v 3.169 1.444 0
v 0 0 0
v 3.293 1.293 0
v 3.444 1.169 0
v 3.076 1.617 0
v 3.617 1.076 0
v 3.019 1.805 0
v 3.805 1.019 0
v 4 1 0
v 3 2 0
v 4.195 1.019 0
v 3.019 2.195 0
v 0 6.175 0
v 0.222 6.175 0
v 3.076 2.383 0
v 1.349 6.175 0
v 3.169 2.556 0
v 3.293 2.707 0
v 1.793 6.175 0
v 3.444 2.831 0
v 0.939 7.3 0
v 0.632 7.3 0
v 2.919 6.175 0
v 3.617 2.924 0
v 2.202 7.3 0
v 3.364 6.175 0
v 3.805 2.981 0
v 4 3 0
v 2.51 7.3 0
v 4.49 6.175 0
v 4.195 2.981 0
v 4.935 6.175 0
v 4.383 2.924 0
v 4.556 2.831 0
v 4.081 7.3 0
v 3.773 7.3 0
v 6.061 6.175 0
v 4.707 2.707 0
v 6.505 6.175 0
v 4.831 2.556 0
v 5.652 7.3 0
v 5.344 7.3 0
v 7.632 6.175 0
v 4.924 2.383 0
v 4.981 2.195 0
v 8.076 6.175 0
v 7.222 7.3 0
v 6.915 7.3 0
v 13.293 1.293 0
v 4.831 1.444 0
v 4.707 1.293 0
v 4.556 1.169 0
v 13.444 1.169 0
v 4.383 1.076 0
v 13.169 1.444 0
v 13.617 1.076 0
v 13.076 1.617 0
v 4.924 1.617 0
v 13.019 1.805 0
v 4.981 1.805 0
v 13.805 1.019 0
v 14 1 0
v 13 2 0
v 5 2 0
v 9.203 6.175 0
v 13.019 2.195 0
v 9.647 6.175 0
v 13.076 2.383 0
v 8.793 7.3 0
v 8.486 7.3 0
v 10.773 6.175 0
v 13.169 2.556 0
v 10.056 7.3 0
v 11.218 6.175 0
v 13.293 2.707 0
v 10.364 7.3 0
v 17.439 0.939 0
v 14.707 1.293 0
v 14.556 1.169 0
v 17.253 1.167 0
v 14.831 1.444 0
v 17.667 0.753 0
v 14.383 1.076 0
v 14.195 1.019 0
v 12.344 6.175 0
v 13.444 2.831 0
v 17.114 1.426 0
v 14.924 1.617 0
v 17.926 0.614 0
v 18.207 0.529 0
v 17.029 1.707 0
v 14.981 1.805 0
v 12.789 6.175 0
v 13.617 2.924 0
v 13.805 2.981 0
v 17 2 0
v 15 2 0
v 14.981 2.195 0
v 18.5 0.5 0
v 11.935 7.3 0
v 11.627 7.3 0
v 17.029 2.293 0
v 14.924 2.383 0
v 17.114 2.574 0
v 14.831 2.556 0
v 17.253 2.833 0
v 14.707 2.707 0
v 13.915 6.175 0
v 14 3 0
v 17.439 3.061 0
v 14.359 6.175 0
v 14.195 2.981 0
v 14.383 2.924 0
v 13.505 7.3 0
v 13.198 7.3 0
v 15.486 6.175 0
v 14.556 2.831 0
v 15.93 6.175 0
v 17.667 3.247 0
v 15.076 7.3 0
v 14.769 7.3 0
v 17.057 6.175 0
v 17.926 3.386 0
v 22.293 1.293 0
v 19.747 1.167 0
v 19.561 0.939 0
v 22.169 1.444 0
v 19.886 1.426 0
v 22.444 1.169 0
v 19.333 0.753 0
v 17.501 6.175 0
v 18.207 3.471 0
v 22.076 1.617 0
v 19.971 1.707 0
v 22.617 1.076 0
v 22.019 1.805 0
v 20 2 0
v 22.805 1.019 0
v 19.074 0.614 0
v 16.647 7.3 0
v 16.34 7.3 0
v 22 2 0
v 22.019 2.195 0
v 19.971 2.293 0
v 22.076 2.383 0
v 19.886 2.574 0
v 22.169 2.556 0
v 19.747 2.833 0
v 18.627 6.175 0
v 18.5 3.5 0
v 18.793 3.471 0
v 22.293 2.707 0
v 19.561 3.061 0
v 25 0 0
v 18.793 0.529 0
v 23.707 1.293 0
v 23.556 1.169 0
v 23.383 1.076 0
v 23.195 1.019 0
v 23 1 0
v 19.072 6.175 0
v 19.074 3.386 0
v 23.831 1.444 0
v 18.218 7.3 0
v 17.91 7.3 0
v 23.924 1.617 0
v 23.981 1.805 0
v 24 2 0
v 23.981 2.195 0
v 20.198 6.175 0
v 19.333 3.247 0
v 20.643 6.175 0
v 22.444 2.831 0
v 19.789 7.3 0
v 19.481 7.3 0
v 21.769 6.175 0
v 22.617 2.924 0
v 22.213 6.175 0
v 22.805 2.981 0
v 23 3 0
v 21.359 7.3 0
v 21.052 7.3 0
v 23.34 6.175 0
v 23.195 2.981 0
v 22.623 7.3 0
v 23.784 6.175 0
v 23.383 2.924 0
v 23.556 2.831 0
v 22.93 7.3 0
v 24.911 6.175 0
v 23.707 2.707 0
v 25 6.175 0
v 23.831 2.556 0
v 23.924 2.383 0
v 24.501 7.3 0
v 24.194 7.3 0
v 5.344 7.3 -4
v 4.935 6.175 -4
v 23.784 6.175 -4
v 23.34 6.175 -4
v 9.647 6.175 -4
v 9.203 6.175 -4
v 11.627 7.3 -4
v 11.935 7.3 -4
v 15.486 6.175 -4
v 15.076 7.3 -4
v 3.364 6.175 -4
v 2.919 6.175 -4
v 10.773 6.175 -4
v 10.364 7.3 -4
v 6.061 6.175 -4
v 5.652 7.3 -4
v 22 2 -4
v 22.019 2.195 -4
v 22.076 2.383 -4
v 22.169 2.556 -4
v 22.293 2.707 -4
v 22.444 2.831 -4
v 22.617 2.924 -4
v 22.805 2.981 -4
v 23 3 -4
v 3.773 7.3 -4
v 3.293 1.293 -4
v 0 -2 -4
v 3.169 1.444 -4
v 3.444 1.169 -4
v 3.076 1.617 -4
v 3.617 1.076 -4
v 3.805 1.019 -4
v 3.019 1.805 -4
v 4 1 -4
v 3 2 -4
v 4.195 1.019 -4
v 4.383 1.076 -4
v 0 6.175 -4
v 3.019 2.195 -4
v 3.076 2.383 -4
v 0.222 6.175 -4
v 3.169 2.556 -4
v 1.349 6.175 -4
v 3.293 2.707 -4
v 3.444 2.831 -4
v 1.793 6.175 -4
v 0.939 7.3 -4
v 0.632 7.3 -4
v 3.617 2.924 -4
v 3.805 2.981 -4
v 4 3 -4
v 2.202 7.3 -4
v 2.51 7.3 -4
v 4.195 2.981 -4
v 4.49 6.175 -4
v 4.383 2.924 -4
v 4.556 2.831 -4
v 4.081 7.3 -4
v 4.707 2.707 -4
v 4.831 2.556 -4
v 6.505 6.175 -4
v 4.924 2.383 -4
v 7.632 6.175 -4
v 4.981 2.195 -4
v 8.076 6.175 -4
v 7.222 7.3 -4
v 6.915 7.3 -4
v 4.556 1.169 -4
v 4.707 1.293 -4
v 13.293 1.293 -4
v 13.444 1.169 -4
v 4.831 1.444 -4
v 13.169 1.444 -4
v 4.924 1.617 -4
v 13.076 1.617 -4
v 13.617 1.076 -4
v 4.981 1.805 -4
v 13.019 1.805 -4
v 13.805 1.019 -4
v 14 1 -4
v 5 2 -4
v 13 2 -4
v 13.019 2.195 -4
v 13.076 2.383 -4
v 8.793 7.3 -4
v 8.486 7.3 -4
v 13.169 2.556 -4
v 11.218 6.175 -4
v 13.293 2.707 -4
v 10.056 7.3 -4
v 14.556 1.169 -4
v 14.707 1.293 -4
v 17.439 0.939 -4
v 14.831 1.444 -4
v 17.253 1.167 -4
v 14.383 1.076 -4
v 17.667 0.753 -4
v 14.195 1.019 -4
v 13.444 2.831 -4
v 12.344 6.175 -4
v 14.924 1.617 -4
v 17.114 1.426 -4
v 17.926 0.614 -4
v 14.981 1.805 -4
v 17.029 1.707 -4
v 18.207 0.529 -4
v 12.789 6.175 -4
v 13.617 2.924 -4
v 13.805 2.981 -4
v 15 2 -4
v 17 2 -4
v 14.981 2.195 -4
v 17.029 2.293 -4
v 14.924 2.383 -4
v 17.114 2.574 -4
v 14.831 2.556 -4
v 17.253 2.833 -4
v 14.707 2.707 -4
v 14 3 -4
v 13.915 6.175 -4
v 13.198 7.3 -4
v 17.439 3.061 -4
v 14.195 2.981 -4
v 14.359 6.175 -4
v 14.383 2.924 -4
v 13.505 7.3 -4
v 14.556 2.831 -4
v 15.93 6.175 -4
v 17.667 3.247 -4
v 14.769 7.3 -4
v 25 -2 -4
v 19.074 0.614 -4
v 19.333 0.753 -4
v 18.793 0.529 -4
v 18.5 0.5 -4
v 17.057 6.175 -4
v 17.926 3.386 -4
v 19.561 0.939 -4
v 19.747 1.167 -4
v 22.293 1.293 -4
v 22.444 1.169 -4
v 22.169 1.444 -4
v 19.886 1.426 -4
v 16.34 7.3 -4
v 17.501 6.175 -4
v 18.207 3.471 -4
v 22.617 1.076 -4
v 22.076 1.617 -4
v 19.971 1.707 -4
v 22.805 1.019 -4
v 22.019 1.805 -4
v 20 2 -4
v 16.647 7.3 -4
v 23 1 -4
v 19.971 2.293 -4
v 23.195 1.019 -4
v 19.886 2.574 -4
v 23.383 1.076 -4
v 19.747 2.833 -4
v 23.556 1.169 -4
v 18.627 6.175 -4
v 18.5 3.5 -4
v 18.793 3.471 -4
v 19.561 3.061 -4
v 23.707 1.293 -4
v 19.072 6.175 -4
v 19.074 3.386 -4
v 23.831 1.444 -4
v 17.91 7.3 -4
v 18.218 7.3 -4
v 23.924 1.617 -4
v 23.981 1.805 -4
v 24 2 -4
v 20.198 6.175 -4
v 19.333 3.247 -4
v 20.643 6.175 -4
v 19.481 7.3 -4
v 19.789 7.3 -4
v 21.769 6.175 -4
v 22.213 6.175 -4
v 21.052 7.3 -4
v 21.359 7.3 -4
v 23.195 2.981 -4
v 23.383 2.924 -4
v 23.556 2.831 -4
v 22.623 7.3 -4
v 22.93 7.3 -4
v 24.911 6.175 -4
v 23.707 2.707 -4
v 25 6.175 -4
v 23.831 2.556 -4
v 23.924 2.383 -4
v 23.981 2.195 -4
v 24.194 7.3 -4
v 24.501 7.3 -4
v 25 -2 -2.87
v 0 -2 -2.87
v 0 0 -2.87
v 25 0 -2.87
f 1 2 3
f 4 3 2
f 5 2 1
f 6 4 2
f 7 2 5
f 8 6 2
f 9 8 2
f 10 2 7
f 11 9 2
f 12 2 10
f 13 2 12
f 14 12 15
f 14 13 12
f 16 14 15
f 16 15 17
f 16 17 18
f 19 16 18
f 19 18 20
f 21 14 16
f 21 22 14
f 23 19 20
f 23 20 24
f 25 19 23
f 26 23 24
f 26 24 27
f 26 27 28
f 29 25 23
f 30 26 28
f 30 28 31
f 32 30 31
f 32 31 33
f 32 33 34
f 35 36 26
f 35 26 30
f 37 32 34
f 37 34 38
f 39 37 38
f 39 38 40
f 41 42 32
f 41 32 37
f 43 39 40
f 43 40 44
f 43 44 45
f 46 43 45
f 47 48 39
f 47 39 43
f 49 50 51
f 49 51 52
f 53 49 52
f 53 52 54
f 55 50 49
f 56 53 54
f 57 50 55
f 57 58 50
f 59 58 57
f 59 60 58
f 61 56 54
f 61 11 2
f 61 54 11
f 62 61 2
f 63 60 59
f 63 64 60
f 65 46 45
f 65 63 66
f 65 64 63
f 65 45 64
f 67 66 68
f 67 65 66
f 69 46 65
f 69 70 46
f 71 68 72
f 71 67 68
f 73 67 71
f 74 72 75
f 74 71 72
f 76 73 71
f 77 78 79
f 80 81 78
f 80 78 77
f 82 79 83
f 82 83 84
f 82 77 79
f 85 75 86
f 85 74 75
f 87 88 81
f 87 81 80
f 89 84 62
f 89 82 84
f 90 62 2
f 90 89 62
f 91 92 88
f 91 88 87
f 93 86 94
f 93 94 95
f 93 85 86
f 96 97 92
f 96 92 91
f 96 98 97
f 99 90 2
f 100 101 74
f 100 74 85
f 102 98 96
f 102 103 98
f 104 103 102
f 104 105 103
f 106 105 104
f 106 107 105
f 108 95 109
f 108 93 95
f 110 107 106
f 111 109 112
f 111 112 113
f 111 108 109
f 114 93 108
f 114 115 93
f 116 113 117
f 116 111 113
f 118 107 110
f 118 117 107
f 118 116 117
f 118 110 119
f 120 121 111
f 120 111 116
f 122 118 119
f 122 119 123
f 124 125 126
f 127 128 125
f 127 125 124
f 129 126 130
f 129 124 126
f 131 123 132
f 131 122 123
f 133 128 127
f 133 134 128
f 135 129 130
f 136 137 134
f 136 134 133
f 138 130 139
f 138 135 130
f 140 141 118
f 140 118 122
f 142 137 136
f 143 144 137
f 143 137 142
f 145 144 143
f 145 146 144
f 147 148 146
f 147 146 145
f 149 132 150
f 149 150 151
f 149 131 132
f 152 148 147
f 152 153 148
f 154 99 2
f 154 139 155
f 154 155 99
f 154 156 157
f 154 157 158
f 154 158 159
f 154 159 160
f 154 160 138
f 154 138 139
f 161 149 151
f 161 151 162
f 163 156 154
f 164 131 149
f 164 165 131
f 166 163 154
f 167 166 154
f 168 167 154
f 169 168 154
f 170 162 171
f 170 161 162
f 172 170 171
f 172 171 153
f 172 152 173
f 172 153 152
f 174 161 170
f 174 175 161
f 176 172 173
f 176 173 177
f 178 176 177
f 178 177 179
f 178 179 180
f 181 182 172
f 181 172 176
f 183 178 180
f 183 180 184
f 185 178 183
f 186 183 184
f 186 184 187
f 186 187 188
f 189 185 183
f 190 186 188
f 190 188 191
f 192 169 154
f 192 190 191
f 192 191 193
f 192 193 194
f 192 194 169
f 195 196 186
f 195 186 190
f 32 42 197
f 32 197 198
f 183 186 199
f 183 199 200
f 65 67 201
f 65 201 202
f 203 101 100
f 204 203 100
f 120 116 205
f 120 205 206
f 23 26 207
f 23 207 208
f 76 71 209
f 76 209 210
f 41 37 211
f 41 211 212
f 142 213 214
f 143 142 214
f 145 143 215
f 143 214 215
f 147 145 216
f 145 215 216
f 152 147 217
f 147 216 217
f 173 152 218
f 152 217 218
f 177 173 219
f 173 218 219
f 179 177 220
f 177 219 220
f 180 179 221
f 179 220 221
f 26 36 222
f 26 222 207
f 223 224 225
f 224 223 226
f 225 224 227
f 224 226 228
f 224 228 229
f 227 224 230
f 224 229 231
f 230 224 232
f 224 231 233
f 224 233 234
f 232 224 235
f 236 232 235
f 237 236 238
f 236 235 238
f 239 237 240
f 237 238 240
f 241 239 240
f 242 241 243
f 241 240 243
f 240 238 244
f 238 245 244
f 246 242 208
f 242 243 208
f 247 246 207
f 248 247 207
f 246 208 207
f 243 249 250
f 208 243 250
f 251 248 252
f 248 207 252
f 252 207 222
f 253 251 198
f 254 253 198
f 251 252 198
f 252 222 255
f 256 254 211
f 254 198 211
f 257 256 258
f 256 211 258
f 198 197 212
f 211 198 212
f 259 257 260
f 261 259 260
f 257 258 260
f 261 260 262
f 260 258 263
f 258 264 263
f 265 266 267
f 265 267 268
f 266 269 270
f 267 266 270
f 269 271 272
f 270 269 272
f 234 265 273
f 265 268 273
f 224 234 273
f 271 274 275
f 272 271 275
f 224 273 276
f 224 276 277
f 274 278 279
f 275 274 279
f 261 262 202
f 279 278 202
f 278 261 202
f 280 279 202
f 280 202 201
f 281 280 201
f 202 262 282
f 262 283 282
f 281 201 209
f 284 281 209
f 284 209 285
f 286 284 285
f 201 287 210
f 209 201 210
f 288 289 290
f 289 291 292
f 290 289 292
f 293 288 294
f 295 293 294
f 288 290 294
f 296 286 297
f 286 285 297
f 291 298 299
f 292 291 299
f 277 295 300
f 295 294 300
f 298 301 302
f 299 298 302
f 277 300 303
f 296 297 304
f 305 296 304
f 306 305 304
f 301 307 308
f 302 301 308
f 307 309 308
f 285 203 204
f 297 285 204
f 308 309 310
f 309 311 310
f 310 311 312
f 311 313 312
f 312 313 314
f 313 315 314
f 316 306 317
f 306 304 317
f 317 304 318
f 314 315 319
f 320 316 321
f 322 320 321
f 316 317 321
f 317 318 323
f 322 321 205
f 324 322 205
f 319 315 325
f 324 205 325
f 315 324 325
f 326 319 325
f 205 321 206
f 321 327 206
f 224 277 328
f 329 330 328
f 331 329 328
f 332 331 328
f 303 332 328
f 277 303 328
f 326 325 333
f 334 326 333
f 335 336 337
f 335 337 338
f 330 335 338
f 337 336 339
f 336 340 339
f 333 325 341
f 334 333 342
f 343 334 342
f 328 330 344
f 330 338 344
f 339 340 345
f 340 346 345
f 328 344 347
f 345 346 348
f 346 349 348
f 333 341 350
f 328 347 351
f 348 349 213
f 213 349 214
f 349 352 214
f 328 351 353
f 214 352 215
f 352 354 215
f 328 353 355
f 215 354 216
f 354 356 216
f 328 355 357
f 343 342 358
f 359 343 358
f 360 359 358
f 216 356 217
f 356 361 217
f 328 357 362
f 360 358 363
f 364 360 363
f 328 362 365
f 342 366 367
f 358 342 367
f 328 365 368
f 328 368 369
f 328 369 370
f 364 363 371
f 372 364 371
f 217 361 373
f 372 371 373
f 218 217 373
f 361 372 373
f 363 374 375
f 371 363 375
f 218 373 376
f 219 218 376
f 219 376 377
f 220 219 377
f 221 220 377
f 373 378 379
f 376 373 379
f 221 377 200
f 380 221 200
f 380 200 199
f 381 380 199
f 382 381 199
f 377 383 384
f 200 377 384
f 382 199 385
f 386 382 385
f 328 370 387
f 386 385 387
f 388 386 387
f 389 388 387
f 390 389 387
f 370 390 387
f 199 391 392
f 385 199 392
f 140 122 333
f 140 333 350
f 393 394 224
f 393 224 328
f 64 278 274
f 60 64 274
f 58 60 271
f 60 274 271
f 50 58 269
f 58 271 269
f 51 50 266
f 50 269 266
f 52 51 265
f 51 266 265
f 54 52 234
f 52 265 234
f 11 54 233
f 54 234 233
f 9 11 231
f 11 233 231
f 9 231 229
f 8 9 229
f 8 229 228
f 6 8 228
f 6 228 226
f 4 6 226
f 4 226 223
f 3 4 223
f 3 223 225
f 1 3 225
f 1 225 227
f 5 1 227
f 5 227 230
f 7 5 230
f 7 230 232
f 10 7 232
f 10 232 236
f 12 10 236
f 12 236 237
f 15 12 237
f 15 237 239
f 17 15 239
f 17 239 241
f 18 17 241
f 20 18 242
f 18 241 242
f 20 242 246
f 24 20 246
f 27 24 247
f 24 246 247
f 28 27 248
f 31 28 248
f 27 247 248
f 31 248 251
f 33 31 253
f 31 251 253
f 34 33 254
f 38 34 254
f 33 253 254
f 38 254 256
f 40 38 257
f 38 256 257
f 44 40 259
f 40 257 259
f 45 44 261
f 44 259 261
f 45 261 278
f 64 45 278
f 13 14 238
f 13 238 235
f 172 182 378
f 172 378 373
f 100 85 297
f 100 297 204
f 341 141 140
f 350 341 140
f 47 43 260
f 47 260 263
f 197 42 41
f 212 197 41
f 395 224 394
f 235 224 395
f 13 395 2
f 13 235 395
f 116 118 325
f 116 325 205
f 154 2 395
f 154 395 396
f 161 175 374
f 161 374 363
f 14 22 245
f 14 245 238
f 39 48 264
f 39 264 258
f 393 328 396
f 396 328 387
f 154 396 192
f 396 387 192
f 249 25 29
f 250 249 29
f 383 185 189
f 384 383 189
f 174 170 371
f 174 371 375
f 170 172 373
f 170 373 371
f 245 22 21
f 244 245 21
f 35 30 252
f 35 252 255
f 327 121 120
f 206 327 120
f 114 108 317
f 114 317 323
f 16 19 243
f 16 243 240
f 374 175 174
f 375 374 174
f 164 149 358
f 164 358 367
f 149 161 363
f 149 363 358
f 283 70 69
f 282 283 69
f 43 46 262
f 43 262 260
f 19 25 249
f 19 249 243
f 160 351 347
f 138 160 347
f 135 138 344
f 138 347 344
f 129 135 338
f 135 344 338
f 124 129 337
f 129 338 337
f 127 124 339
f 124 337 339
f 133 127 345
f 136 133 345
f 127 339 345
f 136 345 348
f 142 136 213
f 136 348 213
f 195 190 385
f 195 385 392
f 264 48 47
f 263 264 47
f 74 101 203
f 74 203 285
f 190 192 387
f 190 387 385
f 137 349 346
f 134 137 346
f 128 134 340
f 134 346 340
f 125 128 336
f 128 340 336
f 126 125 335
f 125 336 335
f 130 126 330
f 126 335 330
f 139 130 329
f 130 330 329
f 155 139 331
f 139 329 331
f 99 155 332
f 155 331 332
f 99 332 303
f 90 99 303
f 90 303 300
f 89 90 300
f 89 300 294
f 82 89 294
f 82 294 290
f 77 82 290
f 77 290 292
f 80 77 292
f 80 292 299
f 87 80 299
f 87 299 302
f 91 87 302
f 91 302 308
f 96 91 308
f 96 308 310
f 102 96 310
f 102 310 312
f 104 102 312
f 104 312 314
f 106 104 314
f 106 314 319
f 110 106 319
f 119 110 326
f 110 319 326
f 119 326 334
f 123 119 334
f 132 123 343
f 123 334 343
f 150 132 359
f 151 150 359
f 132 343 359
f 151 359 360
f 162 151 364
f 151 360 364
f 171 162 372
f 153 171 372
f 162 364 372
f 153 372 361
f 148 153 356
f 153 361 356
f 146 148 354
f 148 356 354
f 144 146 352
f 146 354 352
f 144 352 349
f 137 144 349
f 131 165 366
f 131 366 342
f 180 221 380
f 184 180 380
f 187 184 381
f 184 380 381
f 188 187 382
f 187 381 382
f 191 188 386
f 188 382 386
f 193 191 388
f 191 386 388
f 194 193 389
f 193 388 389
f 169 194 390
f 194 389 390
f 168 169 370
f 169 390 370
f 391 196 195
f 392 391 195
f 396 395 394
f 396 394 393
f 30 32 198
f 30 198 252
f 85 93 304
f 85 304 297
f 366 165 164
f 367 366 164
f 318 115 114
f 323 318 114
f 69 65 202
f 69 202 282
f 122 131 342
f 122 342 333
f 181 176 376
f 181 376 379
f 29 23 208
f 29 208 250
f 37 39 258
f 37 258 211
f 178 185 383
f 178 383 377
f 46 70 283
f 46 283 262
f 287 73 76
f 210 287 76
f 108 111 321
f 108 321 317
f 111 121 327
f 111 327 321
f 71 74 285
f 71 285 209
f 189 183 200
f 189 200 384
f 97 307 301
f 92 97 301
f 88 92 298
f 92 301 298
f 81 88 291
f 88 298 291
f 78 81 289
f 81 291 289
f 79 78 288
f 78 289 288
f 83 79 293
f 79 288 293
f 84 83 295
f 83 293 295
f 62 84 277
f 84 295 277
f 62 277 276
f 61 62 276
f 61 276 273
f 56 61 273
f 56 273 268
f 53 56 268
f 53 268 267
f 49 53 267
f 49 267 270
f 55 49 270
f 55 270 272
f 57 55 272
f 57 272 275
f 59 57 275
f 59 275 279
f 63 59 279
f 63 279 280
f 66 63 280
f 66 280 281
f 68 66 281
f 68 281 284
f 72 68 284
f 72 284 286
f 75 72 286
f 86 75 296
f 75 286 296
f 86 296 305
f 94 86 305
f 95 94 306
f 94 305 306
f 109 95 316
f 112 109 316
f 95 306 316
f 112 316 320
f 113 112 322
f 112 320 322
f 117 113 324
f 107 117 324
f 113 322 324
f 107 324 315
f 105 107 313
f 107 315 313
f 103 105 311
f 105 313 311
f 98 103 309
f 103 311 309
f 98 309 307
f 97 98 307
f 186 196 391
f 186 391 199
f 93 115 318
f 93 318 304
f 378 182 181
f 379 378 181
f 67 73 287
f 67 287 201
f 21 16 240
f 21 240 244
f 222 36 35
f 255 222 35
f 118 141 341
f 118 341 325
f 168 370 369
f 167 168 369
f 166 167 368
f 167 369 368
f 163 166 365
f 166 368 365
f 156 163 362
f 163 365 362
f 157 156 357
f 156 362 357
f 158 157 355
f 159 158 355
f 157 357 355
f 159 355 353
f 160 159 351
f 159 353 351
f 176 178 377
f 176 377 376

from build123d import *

# Parameters (mm, degrees)
BLANKSKE_W          = 25
BLANKSKE_H          = 7.3
BLANK_DEPTH         = 4
TOOTHCUTSIM_DEPTH   = 27.349383294
TEETHCUTS_COUNT     = 17
TEETHCUTS_PITCH     = 1.570796325
CUT_EXTRUDE1_DEPTH  = 27.349383294
SKETCH4_W           = 25
SKETCH4_H           = 1.13
BOSS_EXTRUDE1_DEPTH = 2


with BuildPart() as part:
    # BlankSke → Blank (new body)
    with BuildSketch(Plane.XY):
        with Locations((12.5, 3.65)):
            Rectangle(BLANKSKE_W, BLANKSKE_H)
    extrude(amount=-BLANK_DEPTH)

    # TooCutSkeSim → ToothCutSim (cut, through all)
    with BuildSketch(Plane.XY):
        Polygon((0.222217685, 6.175), (-0.222217685, 6.175), (-0.640929042, 7.3254), (0.640929042, 7.3254), align=None)
    toothcutsim = extrude(amount=-TOOTHCUTSIM_DEPTH, mode=Mode.SUBTRACT)

    # TeethCuts: ToothCutSim ×17
    with Locations(*[(i * TEETHCUTS_PITCH, 0, 0) for i in range(1, TEETHCUTS_COUNT)]):
        add(toothcutsim, mode=Mode.SUBTRACT)

    # Sketch1 → Cut-Extrude1 (cut, through all)
    with BuildSketch(Plane(origin=(0, 0, -4), x_dir=(-1, 0, 0), z_dir=(0, 0, -1))):
        with BuildLine():
            Line((-23, 1), (-23, 2))
            Line((-23, 2), (-24, 2))
            ThreePointArc((-24, 2), (-23.707106781, 1.292893219), (-23, 1))
        make_face()
        with BuildLine():
            Line((-24, 2), (-23, 2))
            Line((-23, 2), (-23, 3))
            ThreePointArc((-23, 3), (-23.707106781, 2.707106781), (-24, 2))
        make_face()
        with BuildLine():
            Line((-23, 3), (-23, 2))
            Line((-23, 2), (-23, 1))
            ThreePointArc((-23, 1), (-22.292893219, 1.292893219), (-22, 2))
            ThreePointArc((-22, 2), (-22.292893219, 2.707106781), (-23, 3))
        make_face()
        with BuildLine():
            ThreePointArc((-17, 2), (-18.5, 3.5), (-20, 2))
            Line((-20, 2), (-17, 2))
        make_face()
        with BuildLine():
            Line((-17, 2), (-20, 2))
            ThreePointArc((-20, 2), (-18.5, 0.5), (-17, 2))
        make_face()
        with BuildLine():
            ThreePointArc((-13, 2), (-14, 3), (-15, 2))
            Line((-15, 2), (-13, 2))
        make_face()
        with BuildLine():
            Line((-13, 2), (-15, 2))
            ThreePointArc((-15, 2), (-14, 1), (-13, 2))
        make_face()
        with BuildLine():
            ThreePointArc((-3, 2), (-4, 3), (-5, 2))
            Line((-5, 2), (-3, 2))
        make_face()
        with BuildLine():
            Line((-3, 2), (-5, 2))
            ThreePointArc((-5, 2), (-4, 1), (-3, 2))
        make_face()
    extrude(amount=-CUT_EXTRUDE1_DEPTH, mode=Mode.SUBTRACT)

    # Sketch4 → Boss-Extrude1 (add)
    with BuildSketch(Plane.XZ):
        with Locations((12.5, -3.435)):
            Rectangle(SKETCH4_W, SKETCH4_H)
    extrude(amount=BOSS_EXTRUDE1_DEPTH)


solid = part.part
